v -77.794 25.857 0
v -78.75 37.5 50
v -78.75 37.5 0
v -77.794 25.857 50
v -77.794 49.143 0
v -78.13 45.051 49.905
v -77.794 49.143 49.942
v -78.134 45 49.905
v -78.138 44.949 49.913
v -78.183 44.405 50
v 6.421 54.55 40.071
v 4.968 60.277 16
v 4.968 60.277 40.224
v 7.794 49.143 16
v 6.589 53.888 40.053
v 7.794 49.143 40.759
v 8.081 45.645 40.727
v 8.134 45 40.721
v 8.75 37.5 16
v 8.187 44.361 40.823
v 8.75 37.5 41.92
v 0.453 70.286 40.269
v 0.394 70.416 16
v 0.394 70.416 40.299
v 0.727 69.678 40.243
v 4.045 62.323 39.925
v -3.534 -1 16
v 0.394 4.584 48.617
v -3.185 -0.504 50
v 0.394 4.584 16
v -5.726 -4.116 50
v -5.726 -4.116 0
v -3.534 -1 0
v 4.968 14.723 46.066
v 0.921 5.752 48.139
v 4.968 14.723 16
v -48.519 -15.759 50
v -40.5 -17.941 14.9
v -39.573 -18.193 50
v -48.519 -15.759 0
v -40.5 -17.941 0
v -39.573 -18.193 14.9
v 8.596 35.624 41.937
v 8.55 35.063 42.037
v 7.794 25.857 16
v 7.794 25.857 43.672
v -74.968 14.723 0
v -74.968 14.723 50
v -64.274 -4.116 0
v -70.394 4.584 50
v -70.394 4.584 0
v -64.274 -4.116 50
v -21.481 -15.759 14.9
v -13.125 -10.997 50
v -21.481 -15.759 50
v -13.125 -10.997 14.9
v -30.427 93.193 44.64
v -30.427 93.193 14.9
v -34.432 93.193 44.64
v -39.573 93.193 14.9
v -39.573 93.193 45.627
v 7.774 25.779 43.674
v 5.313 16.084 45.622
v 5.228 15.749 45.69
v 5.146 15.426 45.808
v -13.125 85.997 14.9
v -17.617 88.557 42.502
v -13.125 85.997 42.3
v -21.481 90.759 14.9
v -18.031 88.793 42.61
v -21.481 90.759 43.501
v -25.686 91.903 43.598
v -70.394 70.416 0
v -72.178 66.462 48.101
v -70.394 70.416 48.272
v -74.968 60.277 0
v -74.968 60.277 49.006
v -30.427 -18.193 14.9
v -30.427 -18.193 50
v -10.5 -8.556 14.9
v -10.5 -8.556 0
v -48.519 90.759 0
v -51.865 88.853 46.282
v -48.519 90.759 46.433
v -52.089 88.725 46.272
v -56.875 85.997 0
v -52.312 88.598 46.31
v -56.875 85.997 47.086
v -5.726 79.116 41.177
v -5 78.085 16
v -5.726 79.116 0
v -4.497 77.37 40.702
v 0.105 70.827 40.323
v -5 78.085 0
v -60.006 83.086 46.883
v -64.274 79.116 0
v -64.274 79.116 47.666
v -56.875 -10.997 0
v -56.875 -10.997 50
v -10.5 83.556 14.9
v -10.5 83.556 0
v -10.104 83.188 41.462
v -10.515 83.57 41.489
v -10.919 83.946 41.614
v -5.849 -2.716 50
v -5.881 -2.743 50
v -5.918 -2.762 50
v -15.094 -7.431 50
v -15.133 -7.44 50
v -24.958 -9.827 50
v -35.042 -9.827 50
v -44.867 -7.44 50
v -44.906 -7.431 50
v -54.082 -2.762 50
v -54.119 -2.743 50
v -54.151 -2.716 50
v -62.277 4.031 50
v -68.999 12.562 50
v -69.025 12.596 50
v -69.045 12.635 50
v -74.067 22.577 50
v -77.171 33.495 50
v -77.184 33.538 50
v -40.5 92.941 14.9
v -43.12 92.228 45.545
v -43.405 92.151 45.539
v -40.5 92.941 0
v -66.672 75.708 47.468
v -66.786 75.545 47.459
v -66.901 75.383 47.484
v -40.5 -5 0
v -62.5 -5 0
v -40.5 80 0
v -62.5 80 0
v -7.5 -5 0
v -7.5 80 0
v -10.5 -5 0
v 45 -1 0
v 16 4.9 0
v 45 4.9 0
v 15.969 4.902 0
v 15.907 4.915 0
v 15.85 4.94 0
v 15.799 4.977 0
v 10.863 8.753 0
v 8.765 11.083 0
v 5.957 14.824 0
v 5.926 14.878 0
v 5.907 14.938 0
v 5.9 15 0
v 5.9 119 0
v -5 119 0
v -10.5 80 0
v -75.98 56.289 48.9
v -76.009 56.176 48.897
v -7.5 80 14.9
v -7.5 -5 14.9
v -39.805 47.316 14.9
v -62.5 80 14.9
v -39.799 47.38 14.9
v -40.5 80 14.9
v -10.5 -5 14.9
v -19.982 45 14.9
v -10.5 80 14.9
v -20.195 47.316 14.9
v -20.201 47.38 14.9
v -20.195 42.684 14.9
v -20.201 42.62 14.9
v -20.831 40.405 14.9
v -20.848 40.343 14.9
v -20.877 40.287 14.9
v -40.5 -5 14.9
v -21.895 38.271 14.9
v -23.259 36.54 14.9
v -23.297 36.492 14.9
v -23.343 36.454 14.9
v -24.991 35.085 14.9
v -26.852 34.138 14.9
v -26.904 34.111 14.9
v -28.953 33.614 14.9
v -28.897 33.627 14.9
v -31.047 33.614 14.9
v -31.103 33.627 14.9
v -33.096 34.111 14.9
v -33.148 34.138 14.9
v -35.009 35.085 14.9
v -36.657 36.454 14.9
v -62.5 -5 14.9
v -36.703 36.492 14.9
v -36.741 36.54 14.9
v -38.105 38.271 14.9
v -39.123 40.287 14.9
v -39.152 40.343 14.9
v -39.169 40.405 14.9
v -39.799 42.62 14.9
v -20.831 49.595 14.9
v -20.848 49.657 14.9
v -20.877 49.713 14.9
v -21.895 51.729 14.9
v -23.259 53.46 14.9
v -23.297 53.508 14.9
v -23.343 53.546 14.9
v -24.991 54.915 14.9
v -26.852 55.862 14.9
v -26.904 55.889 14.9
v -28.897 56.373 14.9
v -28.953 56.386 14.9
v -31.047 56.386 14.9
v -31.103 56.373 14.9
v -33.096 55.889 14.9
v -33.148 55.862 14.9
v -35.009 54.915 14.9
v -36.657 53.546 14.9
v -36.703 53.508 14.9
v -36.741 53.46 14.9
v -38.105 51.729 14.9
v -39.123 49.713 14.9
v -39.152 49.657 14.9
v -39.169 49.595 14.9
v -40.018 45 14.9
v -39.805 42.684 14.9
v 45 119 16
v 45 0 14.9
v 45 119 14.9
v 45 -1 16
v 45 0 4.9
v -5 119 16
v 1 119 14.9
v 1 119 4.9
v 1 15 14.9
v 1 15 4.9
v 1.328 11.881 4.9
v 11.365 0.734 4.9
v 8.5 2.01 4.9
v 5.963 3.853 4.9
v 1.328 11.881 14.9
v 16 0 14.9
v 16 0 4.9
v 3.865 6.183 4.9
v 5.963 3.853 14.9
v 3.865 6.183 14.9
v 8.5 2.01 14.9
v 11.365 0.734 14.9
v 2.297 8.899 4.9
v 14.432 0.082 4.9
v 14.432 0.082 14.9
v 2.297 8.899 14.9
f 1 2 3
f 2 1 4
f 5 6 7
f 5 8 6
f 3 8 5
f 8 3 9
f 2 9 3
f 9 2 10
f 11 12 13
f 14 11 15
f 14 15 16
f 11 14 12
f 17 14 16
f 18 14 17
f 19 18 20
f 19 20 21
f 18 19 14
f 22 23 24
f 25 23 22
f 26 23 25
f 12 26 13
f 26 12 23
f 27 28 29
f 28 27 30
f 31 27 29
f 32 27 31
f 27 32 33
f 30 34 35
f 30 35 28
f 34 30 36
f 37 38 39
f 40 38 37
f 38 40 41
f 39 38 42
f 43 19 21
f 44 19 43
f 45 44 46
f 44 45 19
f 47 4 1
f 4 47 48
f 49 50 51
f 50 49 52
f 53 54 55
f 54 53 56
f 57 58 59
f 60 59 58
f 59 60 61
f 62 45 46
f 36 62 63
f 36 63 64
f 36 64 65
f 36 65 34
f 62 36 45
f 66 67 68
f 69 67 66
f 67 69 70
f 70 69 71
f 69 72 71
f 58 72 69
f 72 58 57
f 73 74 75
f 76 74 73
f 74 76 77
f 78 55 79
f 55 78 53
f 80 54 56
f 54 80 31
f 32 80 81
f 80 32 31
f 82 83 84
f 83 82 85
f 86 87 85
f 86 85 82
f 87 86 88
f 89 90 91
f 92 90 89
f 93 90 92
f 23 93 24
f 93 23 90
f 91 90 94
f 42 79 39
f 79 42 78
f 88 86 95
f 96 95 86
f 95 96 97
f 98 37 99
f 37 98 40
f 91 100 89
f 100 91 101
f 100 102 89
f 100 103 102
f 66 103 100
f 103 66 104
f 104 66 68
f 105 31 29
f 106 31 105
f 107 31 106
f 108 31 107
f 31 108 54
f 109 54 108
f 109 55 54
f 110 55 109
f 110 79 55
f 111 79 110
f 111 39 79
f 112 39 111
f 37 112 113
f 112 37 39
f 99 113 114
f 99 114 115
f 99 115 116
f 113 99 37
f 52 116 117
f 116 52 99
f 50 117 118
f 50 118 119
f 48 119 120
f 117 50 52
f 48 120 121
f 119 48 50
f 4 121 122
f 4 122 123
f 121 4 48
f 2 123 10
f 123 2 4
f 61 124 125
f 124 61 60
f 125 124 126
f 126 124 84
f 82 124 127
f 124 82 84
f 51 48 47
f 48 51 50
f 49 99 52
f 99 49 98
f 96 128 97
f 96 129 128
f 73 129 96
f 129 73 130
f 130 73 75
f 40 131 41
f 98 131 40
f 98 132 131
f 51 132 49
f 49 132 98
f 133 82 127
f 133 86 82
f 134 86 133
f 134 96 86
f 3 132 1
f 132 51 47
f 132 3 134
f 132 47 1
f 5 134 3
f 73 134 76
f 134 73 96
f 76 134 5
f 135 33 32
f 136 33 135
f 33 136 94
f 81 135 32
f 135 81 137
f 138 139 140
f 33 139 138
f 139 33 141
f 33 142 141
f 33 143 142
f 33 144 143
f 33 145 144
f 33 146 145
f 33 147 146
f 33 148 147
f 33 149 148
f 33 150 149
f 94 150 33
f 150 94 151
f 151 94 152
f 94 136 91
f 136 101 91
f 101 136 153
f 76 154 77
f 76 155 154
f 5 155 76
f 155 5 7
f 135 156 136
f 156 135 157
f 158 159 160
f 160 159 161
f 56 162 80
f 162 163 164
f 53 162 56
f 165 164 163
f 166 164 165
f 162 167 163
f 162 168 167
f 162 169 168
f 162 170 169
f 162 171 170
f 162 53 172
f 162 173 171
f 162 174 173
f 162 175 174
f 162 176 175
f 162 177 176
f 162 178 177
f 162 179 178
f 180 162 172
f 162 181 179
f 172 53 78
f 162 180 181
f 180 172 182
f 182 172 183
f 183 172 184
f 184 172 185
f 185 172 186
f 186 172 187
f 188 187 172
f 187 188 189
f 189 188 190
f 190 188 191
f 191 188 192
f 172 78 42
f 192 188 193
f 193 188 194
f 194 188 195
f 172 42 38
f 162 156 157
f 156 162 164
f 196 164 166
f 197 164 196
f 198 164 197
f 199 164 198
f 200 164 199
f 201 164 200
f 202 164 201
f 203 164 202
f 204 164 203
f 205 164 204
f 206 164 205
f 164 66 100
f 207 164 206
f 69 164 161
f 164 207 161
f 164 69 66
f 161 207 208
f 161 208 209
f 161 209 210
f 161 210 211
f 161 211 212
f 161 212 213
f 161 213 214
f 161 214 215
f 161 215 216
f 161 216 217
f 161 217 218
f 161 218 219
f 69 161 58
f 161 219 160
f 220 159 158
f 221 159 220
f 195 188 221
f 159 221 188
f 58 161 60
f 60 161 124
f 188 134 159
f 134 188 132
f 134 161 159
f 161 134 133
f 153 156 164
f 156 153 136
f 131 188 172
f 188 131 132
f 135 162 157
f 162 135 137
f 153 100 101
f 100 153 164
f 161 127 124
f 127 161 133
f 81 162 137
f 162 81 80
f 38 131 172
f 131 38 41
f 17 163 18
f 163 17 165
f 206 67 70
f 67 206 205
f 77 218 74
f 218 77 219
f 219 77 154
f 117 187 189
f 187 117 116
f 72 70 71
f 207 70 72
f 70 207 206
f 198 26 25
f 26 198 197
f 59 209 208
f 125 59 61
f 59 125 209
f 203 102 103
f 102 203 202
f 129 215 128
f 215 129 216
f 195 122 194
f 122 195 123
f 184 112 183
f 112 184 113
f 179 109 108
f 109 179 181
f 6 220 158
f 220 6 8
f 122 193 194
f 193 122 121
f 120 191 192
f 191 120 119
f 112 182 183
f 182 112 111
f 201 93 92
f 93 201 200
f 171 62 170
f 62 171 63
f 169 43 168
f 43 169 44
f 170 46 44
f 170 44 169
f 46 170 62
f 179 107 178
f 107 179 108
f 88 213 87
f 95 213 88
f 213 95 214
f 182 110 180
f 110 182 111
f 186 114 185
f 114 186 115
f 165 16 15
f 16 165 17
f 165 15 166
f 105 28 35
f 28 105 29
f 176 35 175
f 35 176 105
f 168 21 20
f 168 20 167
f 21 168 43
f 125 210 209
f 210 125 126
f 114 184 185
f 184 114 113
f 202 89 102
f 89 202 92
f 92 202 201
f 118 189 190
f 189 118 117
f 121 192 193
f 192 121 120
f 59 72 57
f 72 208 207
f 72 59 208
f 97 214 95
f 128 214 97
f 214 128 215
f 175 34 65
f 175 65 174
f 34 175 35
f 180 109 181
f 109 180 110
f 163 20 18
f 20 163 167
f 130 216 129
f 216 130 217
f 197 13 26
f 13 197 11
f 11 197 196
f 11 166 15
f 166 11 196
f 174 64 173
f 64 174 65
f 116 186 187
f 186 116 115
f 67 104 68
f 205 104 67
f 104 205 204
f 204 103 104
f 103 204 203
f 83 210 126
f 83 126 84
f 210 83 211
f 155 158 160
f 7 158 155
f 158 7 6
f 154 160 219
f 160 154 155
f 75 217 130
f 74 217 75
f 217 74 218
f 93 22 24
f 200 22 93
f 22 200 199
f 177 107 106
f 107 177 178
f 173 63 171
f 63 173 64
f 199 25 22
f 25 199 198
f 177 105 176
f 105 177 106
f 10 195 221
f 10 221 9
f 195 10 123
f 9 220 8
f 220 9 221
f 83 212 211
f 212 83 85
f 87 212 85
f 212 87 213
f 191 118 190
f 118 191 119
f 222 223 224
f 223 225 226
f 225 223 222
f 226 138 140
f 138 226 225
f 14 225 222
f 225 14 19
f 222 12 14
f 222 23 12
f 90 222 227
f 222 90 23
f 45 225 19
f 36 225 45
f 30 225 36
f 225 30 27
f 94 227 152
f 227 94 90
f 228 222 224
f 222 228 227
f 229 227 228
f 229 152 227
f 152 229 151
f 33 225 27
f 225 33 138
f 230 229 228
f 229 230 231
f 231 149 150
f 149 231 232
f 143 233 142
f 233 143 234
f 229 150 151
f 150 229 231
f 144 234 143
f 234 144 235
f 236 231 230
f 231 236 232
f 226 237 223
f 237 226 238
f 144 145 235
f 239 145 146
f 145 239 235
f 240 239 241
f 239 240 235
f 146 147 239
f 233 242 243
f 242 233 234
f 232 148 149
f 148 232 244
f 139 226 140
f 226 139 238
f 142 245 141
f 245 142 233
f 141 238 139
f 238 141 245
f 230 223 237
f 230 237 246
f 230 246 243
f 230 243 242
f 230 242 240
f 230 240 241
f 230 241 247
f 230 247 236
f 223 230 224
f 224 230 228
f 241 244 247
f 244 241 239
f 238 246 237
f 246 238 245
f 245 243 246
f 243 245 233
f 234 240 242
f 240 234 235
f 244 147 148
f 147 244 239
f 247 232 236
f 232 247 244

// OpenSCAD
// computer corner stand in
/*hull()
{
translate([10,0,5])
{
	union()
	{
		translate([10,10,0])
			cube(size=[90,90,10]);
		translate([15,15,0])
			cylinder(r=15,h=10);
		translate([15,0,0])
			cube(size=[85,15,10]);
		translate([0,15,0])
			cube(size=[15,85,10]);
	}
}
color([1,0,0]) translate([10,0,0])
{
	union()
	{
		translate([15,15,0])
			cube(size=[85,85,5]);
		translate([20,20,0])
			cylinder(r=15,h=5);
		translate([15,5,0])
			cube(size=[85,15,5]);
		translate([5,15,0])
			cube(size=[15,85,5]);
	}
}
}*/
//breadboard: 85x55x10mm
//translate([-62.5,10,0])
//	color([0.8,0.8,0.8]) cube(size=[55,85,10]);

// ergo stand
// built for a mac book pro
// holds a breadboard with potentiometer control
difference()
{
	union()
	{
		translate([0,-15,0])
			difference()
			{
				difference()
				{
					translate([-35,52.5,0])
						scale([1.25,1.6,1])
							color ([0,0,1]) cylinder(r=35,h=50);
					translate([-62.5,10,-0.1])
						color([0.8,0.8,0.8]) cube(size=[55,85,15]);
					translate([-40.5,94,-0.1])
						color([0.5,0.5,0.5]) cube(size=[30,20,15]);
					translate([-40.5,-9,-0.1])
						color([0.5,0.5,0.5]) cube(size=[30,20,15]);
				}
				translate([-30,60,14.7])
					scale([1.4,1.6,1])
						color ([0,1,0]) cylinder(r1=7,r2=35,h=36);
			}
			translate([-5,-1,0])
				color ([1,0,0]) cube(size=[50,120,16]);
	}

	hull()
	{
		translate([1,0,4.9])
		{
			union()
			{
				translate([10,10,0])
					cube(size=[90,110,10]);
				translate([15,15,0])
					cylinder(r=15,h=10);
				translate([15,0,0])
					cube(size=[85,15,10]);
				translate([0,15,0])
					cube(size=[15,105,10]);
			}
		}
		color([1,0,0]) translate([1,0,-0.1])
		{
			union()
			{
				translate([15,15,0])
					cube(size=[85,105,5]);
				translate([20,20,0])
					cylinder(r=15,h=5);
				translate([15,5,0])
					cube(size=[85,15,5]);
				translate([5,15,0])
					cube(size=[15,105,5]);
			}
		}
	}
}
